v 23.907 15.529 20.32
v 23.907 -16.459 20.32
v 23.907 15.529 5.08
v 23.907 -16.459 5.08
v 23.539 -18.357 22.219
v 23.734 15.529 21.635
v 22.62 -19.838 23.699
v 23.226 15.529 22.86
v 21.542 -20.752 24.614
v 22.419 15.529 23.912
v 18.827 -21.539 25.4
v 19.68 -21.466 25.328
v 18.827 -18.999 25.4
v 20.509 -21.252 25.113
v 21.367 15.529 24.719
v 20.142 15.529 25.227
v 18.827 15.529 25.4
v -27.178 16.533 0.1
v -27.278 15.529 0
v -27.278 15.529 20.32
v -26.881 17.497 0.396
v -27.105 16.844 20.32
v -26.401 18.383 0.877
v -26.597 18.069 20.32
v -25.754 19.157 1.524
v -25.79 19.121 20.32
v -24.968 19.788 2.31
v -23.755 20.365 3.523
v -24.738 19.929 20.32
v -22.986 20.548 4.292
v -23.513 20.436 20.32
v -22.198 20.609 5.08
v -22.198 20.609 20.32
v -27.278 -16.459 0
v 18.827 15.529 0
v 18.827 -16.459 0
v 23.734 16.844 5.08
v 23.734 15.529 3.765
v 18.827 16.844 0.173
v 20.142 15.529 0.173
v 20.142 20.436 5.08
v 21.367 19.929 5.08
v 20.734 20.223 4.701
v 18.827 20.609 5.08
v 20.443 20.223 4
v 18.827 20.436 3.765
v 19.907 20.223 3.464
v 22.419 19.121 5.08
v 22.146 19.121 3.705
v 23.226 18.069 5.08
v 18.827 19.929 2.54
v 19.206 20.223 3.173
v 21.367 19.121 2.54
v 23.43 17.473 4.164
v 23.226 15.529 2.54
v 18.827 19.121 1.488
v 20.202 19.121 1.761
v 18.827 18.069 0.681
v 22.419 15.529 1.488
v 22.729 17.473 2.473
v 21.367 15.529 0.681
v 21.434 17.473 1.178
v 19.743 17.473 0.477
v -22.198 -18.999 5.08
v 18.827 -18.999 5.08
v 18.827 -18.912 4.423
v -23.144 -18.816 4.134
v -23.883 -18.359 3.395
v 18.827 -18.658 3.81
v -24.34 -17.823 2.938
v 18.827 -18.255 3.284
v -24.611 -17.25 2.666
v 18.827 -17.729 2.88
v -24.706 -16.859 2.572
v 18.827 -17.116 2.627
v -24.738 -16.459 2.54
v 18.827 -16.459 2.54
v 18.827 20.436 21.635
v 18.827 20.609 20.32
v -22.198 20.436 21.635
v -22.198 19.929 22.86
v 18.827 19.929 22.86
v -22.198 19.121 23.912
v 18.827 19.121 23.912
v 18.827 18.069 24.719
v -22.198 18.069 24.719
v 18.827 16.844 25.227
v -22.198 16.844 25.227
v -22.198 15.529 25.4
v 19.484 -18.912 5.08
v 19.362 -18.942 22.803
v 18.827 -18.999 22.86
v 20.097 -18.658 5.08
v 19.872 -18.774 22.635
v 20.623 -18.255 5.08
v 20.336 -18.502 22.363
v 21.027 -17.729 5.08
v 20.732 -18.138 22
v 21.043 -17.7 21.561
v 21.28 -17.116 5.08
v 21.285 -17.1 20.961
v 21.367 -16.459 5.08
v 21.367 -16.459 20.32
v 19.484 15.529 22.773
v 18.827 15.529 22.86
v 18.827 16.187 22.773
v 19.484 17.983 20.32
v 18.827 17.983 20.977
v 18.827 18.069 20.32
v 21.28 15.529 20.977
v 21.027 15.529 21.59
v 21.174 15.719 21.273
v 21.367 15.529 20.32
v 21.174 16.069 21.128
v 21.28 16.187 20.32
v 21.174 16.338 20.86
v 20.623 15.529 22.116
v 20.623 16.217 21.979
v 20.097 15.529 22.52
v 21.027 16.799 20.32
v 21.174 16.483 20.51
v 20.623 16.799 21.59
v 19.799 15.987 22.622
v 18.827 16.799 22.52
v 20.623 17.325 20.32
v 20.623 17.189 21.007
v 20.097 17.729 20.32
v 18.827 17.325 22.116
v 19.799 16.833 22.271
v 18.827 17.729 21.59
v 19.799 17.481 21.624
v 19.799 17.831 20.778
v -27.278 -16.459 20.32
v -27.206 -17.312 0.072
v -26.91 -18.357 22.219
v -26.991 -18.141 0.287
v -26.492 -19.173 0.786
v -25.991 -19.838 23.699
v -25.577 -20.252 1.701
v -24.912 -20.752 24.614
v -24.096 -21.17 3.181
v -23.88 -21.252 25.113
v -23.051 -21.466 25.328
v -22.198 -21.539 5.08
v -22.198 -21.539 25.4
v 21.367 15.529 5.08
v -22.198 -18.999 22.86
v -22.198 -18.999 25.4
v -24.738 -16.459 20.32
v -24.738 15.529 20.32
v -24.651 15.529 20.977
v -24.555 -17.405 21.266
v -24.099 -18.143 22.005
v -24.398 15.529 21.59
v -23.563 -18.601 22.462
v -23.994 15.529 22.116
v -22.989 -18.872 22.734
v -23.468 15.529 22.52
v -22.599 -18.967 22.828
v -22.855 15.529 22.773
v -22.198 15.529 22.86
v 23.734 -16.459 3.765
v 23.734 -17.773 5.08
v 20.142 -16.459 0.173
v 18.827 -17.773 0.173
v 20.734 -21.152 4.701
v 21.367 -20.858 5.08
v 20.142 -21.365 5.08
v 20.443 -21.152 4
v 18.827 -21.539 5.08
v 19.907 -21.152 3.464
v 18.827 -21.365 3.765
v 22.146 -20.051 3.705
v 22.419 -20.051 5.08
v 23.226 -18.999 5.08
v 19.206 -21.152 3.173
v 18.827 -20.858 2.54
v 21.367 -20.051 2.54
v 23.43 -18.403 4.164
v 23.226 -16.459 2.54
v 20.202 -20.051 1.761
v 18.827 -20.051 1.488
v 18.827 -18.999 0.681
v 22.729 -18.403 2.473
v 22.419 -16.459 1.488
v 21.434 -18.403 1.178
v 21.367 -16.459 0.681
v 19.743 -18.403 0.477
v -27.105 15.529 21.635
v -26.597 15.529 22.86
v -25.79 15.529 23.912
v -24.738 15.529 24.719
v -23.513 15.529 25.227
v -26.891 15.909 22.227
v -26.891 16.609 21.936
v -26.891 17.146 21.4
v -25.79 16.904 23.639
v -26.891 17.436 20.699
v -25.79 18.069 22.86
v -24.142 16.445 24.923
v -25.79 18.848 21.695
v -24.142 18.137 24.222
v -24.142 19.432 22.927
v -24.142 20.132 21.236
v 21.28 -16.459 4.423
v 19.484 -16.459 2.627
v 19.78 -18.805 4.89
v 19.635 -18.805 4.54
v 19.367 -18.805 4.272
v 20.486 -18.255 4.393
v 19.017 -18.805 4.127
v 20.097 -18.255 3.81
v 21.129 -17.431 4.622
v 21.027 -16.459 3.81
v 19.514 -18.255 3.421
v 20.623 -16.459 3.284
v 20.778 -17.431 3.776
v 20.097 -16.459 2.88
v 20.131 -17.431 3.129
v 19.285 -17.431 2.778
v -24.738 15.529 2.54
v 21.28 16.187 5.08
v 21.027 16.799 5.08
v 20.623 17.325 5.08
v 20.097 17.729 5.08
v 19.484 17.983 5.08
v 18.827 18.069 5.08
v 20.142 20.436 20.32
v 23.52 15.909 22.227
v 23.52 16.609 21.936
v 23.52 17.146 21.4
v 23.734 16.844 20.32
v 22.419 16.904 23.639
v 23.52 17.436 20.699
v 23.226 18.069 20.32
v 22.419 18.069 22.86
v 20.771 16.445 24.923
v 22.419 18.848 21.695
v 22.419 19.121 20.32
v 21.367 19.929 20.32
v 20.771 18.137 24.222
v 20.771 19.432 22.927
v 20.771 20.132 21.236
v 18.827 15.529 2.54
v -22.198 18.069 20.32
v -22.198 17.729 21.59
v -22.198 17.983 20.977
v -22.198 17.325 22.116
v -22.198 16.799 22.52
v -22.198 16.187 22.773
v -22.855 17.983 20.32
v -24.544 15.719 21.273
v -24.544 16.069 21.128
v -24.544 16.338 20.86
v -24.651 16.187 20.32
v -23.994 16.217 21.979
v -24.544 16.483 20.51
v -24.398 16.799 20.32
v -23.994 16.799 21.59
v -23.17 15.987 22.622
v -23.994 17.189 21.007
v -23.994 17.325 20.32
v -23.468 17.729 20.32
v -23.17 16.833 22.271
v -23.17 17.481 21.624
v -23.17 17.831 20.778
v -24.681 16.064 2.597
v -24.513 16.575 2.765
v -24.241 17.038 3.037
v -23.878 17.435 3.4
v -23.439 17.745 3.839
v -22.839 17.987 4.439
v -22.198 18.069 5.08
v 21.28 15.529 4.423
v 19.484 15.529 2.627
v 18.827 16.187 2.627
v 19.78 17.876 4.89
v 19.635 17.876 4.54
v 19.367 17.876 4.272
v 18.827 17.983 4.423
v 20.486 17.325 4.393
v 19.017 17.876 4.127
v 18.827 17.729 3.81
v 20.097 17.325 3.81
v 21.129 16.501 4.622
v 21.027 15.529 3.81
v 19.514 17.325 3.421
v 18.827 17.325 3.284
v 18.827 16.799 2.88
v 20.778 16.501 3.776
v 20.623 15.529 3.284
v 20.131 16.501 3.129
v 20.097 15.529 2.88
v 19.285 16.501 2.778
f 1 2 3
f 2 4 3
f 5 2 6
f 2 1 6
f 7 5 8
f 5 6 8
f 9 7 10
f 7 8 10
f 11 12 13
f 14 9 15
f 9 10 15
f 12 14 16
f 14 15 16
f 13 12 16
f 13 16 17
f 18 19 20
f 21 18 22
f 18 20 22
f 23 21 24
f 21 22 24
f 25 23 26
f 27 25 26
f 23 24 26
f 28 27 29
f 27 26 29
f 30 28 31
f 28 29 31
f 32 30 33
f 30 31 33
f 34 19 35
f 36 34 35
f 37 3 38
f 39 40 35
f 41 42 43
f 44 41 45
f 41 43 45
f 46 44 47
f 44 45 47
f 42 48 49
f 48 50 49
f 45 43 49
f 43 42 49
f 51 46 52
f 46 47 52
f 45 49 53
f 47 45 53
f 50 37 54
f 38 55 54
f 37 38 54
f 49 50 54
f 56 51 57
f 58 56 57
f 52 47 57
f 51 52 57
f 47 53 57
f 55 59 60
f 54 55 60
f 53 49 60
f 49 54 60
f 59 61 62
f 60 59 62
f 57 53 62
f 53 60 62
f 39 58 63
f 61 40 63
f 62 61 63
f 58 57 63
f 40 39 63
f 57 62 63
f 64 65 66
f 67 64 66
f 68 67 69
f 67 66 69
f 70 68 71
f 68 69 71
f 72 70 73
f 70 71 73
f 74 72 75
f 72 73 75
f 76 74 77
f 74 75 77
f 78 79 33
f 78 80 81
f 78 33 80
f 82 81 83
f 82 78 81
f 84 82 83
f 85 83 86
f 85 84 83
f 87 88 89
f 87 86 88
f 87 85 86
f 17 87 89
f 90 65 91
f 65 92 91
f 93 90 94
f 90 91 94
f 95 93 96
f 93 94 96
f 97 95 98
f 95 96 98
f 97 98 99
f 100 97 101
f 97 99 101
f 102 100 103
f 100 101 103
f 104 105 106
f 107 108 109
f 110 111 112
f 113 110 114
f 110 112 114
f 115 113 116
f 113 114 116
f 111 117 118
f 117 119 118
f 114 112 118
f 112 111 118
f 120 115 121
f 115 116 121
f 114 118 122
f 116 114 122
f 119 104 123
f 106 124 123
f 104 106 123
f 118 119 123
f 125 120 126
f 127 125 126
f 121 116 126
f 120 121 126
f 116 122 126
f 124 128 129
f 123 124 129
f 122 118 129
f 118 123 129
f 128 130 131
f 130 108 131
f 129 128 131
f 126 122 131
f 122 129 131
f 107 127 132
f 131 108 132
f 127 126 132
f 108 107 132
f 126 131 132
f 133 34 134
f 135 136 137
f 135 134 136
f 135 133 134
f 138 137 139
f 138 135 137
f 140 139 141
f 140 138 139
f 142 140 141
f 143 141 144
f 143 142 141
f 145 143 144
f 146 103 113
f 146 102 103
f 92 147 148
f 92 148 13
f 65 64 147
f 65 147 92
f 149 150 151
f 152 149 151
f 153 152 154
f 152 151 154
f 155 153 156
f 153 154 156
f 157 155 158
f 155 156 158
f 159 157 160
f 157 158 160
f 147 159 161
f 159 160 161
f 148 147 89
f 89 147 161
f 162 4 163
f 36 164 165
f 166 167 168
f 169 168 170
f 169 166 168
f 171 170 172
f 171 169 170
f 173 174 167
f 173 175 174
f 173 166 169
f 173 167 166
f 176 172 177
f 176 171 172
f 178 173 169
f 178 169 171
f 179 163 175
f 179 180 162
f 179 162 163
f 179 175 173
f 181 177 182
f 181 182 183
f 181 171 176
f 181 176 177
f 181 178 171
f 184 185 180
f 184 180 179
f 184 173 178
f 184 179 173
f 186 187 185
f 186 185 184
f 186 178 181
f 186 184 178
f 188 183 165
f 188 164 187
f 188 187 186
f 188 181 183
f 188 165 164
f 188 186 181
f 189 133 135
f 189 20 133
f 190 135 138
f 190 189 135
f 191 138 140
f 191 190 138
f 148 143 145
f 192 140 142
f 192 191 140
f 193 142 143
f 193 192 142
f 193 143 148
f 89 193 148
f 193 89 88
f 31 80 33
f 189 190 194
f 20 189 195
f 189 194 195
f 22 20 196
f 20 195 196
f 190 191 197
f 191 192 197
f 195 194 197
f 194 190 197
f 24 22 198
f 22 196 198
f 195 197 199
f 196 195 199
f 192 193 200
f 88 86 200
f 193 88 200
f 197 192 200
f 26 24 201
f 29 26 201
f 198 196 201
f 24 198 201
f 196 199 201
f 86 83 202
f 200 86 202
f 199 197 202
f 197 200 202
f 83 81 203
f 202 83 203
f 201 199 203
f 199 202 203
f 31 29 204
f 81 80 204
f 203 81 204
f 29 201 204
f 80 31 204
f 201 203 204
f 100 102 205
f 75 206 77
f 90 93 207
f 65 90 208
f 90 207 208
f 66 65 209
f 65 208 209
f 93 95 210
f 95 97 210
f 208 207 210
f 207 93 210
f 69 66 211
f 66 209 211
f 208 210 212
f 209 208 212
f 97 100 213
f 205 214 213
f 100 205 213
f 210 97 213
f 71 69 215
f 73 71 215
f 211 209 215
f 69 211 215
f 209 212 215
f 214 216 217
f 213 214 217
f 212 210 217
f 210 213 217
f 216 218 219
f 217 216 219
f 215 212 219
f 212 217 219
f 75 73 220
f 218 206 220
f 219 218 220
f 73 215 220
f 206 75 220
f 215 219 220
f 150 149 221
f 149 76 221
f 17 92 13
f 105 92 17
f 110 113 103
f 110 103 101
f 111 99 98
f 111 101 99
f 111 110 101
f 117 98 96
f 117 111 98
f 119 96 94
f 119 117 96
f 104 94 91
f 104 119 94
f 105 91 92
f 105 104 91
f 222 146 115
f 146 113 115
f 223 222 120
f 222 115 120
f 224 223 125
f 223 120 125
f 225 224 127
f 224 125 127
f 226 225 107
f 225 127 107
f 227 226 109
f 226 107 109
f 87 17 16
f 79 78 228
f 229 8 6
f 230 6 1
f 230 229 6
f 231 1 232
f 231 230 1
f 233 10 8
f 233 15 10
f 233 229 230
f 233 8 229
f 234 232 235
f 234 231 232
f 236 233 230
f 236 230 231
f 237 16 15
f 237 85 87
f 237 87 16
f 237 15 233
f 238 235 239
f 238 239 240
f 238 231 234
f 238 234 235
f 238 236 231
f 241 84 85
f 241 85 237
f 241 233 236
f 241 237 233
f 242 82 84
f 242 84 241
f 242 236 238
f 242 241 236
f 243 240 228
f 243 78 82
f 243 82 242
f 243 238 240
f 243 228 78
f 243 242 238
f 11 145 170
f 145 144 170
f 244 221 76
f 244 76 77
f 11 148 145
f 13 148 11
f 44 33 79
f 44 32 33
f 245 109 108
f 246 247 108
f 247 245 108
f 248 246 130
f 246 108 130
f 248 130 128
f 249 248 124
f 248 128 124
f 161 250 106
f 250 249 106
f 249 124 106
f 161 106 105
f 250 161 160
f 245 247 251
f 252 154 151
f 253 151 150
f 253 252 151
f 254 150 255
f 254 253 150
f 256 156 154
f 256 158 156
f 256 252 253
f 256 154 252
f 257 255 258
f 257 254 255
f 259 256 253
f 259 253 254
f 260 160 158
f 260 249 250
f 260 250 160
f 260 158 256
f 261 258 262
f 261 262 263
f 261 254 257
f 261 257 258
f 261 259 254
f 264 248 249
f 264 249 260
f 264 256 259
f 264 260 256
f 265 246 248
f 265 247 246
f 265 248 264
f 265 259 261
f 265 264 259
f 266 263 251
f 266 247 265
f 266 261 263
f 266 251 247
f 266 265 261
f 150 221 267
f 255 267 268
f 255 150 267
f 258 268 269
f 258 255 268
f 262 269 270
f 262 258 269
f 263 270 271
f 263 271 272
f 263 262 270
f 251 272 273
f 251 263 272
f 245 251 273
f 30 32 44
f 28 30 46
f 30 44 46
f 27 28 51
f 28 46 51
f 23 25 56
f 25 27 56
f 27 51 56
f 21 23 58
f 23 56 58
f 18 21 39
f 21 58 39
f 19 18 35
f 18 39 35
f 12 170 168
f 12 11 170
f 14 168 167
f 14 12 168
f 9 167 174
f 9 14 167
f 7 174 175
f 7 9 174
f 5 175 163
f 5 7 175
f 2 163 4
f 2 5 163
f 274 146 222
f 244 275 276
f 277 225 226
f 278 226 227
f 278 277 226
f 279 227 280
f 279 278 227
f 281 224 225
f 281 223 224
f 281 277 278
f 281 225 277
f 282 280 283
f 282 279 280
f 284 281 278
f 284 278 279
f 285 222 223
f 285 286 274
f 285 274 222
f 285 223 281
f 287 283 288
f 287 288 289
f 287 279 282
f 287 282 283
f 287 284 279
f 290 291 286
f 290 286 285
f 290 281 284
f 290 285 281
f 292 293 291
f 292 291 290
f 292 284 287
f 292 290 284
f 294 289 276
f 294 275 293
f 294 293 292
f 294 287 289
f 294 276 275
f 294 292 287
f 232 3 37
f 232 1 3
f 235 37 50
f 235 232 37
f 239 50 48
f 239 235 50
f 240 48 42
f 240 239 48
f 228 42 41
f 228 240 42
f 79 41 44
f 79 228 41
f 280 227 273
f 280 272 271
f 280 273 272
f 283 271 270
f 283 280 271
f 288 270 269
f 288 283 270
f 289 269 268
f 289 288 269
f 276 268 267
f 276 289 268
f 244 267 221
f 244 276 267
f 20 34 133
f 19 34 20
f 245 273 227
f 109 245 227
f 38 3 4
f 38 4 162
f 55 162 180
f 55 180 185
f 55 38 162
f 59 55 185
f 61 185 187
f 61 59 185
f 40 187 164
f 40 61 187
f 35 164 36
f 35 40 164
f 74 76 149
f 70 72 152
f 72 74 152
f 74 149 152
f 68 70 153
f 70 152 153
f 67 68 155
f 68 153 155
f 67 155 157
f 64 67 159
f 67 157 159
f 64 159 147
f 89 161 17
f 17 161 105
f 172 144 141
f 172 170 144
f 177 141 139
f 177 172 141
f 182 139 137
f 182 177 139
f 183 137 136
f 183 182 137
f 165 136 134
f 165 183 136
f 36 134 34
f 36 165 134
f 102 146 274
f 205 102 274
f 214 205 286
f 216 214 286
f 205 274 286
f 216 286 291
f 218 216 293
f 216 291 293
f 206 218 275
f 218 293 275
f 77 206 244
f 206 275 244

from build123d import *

# Parameters (mm, degrees)
F0_W     = 51.1847995222
F0_H     = 42.1479381621
F1_DEPTH = 25.4
F2_R     = 5.08
F3_T     = -2.54


# Not quite as in the source:
# - a shell that OpenCascade refuses in one call is made with other operations: the cavity is built on its own and cut out


with BuildPart() as f1:
    # F0 (on Top) → F1 (new body)
    with BuildSketch(Plane.XY):
        with Locations((-1.6854219139, -0.4646256566)):
            Rectangle(F0_W, F0_H)
    extrude(amount=F1_DEPTH)

    # F2
    f2_edges = [f1.edges().sort_by_distance(p)[0] for p in [
        (-1.685422, 20.609343, 25.4),
        (-27.277822, -0.464626, 25.4),
        (23.906978, -0.464626, 25.4),
        (23.906978, -0.464626, 0),
        (23.906978, 20.609343, 12.7),
        (23.906978, -21.538595, 12.7),
        (-27.277822, 20.609343, 12.7),
        (-1.685422, -21.538595, 0),
        (-27.277822, -21.538595, 12.7),
        (-1.685422, 20.609343, 0),
    ]]
    fillet(f2_edges, radius=F2_R)

    # F3: a shell. OpenCascade refuses it in one call, so the cavity is built on its own and cut out:
    # the body offset inwards by the wall thickness, plus a prism from it out through each open face.
    f3_core = offset(f1.part, amount=F3_T, mode=Mode.PRIVATE)
    f3_exits = [f3_core.faces().sort_by_distance(p)[0] for p in [
        (-1.685422, -1.734626, 22.86),
    ]]
    add(f3_core, mode=Mode.SUBTRACT)
    extrude(f3_exits, amount=-F3_T, mode=Mode.SUBTRACT)


solid = f1.part
